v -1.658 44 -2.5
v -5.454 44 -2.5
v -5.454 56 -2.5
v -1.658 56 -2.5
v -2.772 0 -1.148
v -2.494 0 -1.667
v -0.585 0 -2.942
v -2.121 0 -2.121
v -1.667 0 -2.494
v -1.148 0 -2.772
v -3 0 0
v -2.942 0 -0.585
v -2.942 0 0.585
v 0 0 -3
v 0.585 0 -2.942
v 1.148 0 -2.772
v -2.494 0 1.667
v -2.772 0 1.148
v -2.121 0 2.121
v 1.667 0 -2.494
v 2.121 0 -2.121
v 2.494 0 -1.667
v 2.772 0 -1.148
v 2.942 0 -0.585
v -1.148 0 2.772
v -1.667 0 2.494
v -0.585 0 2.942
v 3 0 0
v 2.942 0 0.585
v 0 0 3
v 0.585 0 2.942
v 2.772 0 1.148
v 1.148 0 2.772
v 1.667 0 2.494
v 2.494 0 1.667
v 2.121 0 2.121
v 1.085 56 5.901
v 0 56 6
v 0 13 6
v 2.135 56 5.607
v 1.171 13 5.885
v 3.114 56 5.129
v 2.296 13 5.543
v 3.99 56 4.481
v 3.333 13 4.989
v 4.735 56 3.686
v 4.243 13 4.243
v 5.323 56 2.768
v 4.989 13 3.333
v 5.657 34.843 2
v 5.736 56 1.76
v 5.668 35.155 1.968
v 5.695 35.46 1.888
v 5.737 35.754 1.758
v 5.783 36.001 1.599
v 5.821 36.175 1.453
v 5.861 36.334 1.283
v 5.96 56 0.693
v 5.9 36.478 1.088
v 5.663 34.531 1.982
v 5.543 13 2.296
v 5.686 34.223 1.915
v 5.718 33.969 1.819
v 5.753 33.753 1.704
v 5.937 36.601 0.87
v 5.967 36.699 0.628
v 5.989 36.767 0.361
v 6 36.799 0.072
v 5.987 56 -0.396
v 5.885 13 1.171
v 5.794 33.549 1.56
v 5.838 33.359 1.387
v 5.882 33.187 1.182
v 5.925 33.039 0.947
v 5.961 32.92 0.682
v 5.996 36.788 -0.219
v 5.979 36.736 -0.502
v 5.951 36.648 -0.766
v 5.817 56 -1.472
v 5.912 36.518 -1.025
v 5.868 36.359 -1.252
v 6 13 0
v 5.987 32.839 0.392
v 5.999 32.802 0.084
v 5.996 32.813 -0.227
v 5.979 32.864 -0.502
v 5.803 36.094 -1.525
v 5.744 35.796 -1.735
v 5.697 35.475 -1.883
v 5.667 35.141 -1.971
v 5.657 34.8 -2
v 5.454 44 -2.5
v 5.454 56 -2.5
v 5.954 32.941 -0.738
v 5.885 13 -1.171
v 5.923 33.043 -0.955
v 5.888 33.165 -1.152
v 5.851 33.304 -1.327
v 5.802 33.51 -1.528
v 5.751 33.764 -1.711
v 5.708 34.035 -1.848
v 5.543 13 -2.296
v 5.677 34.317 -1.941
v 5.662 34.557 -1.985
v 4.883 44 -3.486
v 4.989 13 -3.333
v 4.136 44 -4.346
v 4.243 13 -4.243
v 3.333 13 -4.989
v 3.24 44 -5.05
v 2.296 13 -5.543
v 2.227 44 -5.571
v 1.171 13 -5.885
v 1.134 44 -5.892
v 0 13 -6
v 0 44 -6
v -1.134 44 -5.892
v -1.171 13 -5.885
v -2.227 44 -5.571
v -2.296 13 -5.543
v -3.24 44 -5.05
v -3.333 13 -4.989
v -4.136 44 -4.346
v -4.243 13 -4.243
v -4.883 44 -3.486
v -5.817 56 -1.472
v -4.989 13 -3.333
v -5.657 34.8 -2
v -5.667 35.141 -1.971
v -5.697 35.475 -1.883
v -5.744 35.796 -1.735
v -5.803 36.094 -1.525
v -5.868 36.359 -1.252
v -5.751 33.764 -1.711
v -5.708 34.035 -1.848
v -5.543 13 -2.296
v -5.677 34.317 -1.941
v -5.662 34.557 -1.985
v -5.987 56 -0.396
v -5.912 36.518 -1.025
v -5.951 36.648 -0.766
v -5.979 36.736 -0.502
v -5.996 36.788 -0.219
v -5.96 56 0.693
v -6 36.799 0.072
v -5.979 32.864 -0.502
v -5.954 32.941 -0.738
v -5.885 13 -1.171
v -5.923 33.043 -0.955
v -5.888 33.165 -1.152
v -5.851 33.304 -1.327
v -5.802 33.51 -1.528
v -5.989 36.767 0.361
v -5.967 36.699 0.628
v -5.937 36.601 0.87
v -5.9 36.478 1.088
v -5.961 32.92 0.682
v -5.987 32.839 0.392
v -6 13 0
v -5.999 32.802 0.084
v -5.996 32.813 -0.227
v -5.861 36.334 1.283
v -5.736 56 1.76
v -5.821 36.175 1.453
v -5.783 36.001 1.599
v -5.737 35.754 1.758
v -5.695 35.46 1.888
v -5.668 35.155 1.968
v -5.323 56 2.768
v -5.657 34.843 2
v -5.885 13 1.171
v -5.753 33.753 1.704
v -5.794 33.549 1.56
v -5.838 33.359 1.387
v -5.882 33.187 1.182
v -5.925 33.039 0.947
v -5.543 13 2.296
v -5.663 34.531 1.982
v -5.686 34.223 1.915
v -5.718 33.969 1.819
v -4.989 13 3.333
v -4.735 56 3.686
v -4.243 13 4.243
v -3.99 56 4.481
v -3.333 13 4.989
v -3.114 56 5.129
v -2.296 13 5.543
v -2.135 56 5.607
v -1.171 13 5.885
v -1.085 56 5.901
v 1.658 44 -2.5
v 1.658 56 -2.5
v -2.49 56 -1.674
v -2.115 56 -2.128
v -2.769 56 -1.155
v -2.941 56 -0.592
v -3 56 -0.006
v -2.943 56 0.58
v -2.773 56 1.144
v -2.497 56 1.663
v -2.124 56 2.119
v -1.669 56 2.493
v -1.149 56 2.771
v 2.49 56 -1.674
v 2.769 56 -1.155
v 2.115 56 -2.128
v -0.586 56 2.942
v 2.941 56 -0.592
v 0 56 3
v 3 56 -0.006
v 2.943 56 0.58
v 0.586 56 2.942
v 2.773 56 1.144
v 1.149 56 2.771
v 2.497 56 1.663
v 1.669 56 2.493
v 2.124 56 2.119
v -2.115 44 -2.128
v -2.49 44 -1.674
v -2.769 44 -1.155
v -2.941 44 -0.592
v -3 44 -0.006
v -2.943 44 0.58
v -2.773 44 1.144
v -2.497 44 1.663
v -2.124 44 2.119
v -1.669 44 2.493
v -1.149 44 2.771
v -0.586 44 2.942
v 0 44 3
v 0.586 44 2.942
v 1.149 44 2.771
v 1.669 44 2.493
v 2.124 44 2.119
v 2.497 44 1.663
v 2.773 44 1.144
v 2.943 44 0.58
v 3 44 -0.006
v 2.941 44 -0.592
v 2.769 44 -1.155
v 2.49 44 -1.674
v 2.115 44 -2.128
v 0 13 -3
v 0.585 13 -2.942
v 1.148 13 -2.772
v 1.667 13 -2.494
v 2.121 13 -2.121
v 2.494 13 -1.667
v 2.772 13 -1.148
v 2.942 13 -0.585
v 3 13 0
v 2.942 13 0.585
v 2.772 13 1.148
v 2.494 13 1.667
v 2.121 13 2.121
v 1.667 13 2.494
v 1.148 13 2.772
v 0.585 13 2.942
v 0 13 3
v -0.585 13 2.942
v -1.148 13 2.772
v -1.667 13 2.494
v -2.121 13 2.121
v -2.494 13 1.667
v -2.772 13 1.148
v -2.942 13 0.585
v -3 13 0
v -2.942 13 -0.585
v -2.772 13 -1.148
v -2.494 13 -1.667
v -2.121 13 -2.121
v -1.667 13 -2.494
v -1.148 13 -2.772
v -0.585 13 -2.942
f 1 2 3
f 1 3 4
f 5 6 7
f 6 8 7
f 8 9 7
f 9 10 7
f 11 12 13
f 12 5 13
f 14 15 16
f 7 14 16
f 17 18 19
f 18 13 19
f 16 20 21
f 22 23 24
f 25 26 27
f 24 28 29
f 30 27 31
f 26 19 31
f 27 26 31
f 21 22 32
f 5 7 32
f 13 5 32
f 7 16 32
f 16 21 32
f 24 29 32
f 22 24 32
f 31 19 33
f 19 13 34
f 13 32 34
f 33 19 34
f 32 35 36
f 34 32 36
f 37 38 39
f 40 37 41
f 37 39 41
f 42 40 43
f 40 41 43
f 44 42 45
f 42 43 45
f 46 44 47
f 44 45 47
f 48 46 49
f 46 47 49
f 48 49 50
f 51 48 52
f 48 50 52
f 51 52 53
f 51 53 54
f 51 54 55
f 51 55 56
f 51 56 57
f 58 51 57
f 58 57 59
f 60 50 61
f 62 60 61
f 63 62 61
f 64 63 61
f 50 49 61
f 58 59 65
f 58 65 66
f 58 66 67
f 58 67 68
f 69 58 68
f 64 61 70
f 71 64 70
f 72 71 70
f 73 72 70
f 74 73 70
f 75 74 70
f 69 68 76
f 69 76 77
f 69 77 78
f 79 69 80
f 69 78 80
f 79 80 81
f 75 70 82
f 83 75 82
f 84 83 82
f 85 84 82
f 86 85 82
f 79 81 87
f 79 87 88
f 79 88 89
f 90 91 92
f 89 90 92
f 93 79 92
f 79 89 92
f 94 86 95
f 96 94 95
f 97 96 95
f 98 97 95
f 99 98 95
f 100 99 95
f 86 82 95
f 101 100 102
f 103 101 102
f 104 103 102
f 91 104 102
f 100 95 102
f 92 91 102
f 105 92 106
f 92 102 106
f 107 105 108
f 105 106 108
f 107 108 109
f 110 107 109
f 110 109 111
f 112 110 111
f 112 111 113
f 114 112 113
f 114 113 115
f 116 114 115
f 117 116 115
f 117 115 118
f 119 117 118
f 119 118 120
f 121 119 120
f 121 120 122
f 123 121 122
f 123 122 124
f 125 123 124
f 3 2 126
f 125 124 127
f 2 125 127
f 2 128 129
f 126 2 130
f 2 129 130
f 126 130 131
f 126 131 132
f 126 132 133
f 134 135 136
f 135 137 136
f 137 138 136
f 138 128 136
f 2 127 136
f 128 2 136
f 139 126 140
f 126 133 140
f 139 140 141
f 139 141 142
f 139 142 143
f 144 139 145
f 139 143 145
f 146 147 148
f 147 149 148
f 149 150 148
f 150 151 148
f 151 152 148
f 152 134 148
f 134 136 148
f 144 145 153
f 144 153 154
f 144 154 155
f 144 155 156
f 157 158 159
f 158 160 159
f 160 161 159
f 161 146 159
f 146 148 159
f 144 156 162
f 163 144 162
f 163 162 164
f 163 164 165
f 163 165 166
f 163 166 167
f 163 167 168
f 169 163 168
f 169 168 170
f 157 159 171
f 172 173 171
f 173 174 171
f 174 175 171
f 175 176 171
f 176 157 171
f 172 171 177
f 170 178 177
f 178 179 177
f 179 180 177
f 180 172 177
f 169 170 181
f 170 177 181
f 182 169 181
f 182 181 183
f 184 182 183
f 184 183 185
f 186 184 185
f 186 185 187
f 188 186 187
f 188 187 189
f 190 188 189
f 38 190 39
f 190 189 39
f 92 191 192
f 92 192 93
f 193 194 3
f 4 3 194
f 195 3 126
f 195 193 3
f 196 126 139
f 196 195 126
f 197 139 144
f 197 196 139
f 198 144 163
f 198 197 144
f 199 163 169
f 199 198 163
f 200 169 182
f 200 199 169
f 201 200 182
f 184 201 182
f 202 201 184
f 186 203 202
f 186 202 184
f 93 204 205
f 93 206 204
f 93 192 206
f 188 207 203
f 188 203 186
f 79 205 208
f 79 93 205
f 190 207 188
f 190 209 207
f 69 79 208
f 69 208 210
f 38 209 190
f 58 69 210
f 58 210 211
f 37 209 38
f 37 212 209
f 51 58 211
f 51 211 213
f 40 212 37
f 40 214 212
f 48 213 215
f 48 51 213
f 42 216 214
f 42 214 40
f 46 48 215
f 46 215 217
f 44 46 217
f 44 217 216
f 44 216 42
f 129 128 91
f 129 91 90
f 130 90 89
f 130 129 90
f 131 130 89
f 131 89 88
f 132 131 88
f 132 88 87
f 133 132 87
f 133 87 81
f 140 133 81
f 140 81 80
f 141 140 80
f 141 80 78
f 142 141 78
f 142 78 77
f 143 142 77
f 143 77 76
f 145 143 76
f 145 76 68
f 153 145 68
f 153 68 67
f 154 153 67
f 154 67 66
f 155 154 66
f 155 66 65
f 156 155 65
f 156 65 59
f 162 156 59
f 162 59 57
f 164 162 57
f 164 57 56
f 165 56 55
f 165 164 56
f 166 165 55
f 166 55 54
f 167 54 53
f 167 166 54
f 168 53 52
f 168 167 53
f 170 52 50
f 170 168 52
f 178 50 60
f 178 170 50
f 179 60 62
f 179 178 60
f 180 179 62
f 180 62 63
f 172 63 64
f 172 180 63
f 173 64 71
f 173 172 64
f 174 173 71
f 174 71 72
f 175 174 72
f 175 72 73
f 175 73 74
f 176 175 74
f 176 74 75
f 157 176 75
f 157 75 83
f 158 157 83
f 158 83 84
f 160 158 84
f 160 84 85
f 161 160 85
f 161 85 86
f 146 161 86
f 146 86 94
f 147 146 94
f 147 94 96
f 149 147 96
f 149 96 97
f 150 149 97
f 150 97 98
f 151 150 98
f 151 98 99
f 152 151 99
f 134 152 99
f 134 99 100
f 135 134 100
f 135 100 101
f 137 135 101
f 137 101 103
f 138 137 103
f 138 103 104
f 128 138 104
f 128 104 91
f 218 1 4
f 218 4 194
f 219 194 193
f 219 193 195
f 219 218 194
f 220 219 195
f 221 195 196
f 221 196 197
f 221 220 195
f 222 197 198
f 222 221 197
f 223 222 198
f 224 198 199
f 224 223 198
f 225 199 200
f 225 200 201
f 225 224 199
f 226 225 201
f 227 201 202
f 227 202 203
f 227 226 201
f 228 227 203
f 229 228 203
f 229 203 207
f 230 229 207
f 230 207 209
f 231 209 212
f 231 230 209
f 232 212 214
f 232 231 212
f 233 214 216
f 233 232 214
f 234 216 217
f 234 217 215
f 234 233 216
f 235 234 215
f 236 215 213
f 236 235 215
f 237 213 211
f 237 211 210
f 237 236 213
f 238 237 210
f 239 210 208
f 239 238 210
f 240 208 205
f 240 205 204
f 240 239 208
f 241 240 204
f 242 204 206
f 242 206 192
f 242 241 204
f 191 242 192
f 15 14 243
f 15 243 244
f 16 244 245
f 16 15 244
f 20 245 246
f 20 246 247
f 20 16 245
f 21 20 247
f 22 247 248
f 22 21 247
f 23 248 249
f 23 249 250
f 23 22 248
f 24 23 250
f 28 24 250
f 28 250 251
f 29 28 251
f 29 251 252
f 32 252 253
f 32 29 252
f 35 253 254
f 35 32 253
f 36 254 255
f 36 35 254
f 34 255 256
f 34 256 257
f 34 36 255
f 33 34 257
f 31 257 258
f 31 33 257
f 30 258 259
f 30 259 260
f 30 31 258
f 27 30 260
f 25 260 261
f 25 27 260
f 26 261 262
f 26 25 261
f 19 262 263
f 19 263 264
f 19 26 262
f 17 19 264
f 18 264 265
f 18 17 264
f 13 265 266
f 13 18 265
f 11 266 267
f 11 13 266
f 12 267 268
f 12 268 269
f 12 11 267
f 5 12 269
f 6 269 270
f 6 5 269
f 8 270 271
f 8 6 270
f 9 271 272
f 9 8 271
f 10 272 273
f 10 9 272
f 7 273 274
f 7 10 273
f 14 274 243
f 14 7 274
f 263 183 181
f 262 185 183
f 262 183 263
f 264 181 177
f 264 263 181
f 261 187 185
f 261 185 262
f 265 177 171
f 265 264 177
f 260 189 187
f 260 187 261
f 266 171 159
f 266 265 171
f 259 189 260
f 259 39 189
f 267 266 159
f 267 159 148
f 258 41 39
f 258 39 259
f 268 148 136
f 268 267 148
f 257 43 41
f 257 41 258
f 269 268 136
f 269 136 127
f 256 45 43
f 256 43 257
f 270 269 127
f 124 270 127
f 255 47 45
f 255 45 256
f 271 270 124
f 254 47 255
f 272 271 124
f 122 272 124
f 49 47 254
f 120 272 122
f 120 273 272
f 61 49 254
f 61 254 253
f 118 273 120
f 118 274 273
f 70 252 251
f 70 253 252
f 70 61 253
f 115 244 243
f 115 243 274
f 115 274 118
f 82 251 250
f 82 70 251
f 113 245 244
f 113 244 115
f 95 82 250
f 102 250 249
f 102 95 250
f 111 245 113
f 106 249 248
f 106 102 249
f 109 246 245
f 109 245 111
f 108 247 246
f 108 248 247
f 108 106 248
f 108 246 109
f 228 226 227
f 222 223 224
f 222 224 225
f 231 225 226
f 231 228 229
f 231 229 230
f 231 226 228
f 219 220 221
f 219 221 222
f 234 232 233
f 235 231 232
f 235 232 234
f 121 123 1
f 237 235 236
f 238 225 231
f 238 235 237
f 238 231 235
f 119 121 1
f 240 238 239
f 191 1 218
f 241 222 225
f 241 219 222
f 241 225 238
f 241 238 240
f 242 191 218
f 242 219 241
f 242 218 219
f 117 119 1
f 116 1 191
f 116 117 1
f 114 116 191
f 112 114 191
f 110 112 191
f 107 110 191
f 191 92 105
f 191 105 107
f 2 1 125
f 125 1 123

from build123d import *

# Parameters (mm, degrees)
SKETCH_1_R               = 6
EXTRUDE_1_DEPTH          = 56
CUT_EXTRUDE_START        = -12
CUT_EXTRUDE_1_DEPTH      = 12
SKETCH_3_R               = 6
SKETCH_3_R_2             = 3
CUT_EXTRUDE_2_DEPTH      = 13
CUT_EXTRUDE_6_DEPTH      = 57.639209034
CUT_EXTRUDE_6_DEPTH_BACK = 57.639209034
SKETCH_6_R               = 2


with BuildPart() as part:
    # ｽｹｯﾁ1 → ﾎﾞｽ - 押し出し1 (new body)
    with BuildSketch(Plane(origin=(0, 0, 0), x_dir=(1, 0, 0), z_dir=(0, 1, 0))):
        with Locations(Location((0, 0, 0), (0, 0, 270))):
            Circle(SKETCH_1_R)
    extrude(amount=EXTRUDE_1_DEPTH)

    # ｽｹｯﾁ2 → ｶｯﾄ - 押し出し1 (cut)
    with BuildSketch(Plane(origin=(0, 56, 0), x_dir=(1, 0, 0), z_dir=(0, 1, 0)).offset(CUT_EXTRUDE_START)):
        with BuildLine():
            Line((1.658312395, 2.5), (5.454356057, 2.5))
            ThreePointArc((5.454356057, 2.5), (0, 6), (-5.454356057, 2.5))
            Line((-5.454356057, 2.5), (-1.658312395, 2.5))
            ThreePointArc((-1.658312395, 2.5), (0, -3), (1.658312395, 2.5))
        make_face()
    extrude(amount=CUT_EXTRUDE_1_DEPTH, mode=Mode.SUBTRACT)

    # ｽｹｯﾁ3 → ｶｯﾄ - 押し出し2 (cut)
    with BuildSketch(Plane.XZ):
        with Locations(Location((0, 0, 0), (0, 0, 270))):
            Circle(SKETCH_3_R)
        with Locations(Location((0, 0, 0), (0, 0, 270))):
            Circle(SKETCH_3_R_2, mode=Mode.SUBTRACT)
    extrude(amount=-CUT_EXTRUDE_2_DEPTH, mode=Mode.SUBTRACT)

    # ｽｹｯﾁ6 → ｶｯﾄ - 押し出し6 (cut, two sides: drawn at the far end of the back side and taken through both)
    with BuildSketch(Plane(origin=(0, 0, 0), x_dir=(0, 0, -1), z_dir=(1, 0, 0)).offset(-CUT_EXTRUDE_6_DEPTH_BACK)):
        with Locations((0, 34.8)):
            Circle(SKETCH_6_R)
    extrude(amount=CUT_EXTRUDE_6_DEPTH + CUT_EXTRUDE_6_DEPTH_BACK, mode=Mode.SUBTRACT)


solid = part.part
